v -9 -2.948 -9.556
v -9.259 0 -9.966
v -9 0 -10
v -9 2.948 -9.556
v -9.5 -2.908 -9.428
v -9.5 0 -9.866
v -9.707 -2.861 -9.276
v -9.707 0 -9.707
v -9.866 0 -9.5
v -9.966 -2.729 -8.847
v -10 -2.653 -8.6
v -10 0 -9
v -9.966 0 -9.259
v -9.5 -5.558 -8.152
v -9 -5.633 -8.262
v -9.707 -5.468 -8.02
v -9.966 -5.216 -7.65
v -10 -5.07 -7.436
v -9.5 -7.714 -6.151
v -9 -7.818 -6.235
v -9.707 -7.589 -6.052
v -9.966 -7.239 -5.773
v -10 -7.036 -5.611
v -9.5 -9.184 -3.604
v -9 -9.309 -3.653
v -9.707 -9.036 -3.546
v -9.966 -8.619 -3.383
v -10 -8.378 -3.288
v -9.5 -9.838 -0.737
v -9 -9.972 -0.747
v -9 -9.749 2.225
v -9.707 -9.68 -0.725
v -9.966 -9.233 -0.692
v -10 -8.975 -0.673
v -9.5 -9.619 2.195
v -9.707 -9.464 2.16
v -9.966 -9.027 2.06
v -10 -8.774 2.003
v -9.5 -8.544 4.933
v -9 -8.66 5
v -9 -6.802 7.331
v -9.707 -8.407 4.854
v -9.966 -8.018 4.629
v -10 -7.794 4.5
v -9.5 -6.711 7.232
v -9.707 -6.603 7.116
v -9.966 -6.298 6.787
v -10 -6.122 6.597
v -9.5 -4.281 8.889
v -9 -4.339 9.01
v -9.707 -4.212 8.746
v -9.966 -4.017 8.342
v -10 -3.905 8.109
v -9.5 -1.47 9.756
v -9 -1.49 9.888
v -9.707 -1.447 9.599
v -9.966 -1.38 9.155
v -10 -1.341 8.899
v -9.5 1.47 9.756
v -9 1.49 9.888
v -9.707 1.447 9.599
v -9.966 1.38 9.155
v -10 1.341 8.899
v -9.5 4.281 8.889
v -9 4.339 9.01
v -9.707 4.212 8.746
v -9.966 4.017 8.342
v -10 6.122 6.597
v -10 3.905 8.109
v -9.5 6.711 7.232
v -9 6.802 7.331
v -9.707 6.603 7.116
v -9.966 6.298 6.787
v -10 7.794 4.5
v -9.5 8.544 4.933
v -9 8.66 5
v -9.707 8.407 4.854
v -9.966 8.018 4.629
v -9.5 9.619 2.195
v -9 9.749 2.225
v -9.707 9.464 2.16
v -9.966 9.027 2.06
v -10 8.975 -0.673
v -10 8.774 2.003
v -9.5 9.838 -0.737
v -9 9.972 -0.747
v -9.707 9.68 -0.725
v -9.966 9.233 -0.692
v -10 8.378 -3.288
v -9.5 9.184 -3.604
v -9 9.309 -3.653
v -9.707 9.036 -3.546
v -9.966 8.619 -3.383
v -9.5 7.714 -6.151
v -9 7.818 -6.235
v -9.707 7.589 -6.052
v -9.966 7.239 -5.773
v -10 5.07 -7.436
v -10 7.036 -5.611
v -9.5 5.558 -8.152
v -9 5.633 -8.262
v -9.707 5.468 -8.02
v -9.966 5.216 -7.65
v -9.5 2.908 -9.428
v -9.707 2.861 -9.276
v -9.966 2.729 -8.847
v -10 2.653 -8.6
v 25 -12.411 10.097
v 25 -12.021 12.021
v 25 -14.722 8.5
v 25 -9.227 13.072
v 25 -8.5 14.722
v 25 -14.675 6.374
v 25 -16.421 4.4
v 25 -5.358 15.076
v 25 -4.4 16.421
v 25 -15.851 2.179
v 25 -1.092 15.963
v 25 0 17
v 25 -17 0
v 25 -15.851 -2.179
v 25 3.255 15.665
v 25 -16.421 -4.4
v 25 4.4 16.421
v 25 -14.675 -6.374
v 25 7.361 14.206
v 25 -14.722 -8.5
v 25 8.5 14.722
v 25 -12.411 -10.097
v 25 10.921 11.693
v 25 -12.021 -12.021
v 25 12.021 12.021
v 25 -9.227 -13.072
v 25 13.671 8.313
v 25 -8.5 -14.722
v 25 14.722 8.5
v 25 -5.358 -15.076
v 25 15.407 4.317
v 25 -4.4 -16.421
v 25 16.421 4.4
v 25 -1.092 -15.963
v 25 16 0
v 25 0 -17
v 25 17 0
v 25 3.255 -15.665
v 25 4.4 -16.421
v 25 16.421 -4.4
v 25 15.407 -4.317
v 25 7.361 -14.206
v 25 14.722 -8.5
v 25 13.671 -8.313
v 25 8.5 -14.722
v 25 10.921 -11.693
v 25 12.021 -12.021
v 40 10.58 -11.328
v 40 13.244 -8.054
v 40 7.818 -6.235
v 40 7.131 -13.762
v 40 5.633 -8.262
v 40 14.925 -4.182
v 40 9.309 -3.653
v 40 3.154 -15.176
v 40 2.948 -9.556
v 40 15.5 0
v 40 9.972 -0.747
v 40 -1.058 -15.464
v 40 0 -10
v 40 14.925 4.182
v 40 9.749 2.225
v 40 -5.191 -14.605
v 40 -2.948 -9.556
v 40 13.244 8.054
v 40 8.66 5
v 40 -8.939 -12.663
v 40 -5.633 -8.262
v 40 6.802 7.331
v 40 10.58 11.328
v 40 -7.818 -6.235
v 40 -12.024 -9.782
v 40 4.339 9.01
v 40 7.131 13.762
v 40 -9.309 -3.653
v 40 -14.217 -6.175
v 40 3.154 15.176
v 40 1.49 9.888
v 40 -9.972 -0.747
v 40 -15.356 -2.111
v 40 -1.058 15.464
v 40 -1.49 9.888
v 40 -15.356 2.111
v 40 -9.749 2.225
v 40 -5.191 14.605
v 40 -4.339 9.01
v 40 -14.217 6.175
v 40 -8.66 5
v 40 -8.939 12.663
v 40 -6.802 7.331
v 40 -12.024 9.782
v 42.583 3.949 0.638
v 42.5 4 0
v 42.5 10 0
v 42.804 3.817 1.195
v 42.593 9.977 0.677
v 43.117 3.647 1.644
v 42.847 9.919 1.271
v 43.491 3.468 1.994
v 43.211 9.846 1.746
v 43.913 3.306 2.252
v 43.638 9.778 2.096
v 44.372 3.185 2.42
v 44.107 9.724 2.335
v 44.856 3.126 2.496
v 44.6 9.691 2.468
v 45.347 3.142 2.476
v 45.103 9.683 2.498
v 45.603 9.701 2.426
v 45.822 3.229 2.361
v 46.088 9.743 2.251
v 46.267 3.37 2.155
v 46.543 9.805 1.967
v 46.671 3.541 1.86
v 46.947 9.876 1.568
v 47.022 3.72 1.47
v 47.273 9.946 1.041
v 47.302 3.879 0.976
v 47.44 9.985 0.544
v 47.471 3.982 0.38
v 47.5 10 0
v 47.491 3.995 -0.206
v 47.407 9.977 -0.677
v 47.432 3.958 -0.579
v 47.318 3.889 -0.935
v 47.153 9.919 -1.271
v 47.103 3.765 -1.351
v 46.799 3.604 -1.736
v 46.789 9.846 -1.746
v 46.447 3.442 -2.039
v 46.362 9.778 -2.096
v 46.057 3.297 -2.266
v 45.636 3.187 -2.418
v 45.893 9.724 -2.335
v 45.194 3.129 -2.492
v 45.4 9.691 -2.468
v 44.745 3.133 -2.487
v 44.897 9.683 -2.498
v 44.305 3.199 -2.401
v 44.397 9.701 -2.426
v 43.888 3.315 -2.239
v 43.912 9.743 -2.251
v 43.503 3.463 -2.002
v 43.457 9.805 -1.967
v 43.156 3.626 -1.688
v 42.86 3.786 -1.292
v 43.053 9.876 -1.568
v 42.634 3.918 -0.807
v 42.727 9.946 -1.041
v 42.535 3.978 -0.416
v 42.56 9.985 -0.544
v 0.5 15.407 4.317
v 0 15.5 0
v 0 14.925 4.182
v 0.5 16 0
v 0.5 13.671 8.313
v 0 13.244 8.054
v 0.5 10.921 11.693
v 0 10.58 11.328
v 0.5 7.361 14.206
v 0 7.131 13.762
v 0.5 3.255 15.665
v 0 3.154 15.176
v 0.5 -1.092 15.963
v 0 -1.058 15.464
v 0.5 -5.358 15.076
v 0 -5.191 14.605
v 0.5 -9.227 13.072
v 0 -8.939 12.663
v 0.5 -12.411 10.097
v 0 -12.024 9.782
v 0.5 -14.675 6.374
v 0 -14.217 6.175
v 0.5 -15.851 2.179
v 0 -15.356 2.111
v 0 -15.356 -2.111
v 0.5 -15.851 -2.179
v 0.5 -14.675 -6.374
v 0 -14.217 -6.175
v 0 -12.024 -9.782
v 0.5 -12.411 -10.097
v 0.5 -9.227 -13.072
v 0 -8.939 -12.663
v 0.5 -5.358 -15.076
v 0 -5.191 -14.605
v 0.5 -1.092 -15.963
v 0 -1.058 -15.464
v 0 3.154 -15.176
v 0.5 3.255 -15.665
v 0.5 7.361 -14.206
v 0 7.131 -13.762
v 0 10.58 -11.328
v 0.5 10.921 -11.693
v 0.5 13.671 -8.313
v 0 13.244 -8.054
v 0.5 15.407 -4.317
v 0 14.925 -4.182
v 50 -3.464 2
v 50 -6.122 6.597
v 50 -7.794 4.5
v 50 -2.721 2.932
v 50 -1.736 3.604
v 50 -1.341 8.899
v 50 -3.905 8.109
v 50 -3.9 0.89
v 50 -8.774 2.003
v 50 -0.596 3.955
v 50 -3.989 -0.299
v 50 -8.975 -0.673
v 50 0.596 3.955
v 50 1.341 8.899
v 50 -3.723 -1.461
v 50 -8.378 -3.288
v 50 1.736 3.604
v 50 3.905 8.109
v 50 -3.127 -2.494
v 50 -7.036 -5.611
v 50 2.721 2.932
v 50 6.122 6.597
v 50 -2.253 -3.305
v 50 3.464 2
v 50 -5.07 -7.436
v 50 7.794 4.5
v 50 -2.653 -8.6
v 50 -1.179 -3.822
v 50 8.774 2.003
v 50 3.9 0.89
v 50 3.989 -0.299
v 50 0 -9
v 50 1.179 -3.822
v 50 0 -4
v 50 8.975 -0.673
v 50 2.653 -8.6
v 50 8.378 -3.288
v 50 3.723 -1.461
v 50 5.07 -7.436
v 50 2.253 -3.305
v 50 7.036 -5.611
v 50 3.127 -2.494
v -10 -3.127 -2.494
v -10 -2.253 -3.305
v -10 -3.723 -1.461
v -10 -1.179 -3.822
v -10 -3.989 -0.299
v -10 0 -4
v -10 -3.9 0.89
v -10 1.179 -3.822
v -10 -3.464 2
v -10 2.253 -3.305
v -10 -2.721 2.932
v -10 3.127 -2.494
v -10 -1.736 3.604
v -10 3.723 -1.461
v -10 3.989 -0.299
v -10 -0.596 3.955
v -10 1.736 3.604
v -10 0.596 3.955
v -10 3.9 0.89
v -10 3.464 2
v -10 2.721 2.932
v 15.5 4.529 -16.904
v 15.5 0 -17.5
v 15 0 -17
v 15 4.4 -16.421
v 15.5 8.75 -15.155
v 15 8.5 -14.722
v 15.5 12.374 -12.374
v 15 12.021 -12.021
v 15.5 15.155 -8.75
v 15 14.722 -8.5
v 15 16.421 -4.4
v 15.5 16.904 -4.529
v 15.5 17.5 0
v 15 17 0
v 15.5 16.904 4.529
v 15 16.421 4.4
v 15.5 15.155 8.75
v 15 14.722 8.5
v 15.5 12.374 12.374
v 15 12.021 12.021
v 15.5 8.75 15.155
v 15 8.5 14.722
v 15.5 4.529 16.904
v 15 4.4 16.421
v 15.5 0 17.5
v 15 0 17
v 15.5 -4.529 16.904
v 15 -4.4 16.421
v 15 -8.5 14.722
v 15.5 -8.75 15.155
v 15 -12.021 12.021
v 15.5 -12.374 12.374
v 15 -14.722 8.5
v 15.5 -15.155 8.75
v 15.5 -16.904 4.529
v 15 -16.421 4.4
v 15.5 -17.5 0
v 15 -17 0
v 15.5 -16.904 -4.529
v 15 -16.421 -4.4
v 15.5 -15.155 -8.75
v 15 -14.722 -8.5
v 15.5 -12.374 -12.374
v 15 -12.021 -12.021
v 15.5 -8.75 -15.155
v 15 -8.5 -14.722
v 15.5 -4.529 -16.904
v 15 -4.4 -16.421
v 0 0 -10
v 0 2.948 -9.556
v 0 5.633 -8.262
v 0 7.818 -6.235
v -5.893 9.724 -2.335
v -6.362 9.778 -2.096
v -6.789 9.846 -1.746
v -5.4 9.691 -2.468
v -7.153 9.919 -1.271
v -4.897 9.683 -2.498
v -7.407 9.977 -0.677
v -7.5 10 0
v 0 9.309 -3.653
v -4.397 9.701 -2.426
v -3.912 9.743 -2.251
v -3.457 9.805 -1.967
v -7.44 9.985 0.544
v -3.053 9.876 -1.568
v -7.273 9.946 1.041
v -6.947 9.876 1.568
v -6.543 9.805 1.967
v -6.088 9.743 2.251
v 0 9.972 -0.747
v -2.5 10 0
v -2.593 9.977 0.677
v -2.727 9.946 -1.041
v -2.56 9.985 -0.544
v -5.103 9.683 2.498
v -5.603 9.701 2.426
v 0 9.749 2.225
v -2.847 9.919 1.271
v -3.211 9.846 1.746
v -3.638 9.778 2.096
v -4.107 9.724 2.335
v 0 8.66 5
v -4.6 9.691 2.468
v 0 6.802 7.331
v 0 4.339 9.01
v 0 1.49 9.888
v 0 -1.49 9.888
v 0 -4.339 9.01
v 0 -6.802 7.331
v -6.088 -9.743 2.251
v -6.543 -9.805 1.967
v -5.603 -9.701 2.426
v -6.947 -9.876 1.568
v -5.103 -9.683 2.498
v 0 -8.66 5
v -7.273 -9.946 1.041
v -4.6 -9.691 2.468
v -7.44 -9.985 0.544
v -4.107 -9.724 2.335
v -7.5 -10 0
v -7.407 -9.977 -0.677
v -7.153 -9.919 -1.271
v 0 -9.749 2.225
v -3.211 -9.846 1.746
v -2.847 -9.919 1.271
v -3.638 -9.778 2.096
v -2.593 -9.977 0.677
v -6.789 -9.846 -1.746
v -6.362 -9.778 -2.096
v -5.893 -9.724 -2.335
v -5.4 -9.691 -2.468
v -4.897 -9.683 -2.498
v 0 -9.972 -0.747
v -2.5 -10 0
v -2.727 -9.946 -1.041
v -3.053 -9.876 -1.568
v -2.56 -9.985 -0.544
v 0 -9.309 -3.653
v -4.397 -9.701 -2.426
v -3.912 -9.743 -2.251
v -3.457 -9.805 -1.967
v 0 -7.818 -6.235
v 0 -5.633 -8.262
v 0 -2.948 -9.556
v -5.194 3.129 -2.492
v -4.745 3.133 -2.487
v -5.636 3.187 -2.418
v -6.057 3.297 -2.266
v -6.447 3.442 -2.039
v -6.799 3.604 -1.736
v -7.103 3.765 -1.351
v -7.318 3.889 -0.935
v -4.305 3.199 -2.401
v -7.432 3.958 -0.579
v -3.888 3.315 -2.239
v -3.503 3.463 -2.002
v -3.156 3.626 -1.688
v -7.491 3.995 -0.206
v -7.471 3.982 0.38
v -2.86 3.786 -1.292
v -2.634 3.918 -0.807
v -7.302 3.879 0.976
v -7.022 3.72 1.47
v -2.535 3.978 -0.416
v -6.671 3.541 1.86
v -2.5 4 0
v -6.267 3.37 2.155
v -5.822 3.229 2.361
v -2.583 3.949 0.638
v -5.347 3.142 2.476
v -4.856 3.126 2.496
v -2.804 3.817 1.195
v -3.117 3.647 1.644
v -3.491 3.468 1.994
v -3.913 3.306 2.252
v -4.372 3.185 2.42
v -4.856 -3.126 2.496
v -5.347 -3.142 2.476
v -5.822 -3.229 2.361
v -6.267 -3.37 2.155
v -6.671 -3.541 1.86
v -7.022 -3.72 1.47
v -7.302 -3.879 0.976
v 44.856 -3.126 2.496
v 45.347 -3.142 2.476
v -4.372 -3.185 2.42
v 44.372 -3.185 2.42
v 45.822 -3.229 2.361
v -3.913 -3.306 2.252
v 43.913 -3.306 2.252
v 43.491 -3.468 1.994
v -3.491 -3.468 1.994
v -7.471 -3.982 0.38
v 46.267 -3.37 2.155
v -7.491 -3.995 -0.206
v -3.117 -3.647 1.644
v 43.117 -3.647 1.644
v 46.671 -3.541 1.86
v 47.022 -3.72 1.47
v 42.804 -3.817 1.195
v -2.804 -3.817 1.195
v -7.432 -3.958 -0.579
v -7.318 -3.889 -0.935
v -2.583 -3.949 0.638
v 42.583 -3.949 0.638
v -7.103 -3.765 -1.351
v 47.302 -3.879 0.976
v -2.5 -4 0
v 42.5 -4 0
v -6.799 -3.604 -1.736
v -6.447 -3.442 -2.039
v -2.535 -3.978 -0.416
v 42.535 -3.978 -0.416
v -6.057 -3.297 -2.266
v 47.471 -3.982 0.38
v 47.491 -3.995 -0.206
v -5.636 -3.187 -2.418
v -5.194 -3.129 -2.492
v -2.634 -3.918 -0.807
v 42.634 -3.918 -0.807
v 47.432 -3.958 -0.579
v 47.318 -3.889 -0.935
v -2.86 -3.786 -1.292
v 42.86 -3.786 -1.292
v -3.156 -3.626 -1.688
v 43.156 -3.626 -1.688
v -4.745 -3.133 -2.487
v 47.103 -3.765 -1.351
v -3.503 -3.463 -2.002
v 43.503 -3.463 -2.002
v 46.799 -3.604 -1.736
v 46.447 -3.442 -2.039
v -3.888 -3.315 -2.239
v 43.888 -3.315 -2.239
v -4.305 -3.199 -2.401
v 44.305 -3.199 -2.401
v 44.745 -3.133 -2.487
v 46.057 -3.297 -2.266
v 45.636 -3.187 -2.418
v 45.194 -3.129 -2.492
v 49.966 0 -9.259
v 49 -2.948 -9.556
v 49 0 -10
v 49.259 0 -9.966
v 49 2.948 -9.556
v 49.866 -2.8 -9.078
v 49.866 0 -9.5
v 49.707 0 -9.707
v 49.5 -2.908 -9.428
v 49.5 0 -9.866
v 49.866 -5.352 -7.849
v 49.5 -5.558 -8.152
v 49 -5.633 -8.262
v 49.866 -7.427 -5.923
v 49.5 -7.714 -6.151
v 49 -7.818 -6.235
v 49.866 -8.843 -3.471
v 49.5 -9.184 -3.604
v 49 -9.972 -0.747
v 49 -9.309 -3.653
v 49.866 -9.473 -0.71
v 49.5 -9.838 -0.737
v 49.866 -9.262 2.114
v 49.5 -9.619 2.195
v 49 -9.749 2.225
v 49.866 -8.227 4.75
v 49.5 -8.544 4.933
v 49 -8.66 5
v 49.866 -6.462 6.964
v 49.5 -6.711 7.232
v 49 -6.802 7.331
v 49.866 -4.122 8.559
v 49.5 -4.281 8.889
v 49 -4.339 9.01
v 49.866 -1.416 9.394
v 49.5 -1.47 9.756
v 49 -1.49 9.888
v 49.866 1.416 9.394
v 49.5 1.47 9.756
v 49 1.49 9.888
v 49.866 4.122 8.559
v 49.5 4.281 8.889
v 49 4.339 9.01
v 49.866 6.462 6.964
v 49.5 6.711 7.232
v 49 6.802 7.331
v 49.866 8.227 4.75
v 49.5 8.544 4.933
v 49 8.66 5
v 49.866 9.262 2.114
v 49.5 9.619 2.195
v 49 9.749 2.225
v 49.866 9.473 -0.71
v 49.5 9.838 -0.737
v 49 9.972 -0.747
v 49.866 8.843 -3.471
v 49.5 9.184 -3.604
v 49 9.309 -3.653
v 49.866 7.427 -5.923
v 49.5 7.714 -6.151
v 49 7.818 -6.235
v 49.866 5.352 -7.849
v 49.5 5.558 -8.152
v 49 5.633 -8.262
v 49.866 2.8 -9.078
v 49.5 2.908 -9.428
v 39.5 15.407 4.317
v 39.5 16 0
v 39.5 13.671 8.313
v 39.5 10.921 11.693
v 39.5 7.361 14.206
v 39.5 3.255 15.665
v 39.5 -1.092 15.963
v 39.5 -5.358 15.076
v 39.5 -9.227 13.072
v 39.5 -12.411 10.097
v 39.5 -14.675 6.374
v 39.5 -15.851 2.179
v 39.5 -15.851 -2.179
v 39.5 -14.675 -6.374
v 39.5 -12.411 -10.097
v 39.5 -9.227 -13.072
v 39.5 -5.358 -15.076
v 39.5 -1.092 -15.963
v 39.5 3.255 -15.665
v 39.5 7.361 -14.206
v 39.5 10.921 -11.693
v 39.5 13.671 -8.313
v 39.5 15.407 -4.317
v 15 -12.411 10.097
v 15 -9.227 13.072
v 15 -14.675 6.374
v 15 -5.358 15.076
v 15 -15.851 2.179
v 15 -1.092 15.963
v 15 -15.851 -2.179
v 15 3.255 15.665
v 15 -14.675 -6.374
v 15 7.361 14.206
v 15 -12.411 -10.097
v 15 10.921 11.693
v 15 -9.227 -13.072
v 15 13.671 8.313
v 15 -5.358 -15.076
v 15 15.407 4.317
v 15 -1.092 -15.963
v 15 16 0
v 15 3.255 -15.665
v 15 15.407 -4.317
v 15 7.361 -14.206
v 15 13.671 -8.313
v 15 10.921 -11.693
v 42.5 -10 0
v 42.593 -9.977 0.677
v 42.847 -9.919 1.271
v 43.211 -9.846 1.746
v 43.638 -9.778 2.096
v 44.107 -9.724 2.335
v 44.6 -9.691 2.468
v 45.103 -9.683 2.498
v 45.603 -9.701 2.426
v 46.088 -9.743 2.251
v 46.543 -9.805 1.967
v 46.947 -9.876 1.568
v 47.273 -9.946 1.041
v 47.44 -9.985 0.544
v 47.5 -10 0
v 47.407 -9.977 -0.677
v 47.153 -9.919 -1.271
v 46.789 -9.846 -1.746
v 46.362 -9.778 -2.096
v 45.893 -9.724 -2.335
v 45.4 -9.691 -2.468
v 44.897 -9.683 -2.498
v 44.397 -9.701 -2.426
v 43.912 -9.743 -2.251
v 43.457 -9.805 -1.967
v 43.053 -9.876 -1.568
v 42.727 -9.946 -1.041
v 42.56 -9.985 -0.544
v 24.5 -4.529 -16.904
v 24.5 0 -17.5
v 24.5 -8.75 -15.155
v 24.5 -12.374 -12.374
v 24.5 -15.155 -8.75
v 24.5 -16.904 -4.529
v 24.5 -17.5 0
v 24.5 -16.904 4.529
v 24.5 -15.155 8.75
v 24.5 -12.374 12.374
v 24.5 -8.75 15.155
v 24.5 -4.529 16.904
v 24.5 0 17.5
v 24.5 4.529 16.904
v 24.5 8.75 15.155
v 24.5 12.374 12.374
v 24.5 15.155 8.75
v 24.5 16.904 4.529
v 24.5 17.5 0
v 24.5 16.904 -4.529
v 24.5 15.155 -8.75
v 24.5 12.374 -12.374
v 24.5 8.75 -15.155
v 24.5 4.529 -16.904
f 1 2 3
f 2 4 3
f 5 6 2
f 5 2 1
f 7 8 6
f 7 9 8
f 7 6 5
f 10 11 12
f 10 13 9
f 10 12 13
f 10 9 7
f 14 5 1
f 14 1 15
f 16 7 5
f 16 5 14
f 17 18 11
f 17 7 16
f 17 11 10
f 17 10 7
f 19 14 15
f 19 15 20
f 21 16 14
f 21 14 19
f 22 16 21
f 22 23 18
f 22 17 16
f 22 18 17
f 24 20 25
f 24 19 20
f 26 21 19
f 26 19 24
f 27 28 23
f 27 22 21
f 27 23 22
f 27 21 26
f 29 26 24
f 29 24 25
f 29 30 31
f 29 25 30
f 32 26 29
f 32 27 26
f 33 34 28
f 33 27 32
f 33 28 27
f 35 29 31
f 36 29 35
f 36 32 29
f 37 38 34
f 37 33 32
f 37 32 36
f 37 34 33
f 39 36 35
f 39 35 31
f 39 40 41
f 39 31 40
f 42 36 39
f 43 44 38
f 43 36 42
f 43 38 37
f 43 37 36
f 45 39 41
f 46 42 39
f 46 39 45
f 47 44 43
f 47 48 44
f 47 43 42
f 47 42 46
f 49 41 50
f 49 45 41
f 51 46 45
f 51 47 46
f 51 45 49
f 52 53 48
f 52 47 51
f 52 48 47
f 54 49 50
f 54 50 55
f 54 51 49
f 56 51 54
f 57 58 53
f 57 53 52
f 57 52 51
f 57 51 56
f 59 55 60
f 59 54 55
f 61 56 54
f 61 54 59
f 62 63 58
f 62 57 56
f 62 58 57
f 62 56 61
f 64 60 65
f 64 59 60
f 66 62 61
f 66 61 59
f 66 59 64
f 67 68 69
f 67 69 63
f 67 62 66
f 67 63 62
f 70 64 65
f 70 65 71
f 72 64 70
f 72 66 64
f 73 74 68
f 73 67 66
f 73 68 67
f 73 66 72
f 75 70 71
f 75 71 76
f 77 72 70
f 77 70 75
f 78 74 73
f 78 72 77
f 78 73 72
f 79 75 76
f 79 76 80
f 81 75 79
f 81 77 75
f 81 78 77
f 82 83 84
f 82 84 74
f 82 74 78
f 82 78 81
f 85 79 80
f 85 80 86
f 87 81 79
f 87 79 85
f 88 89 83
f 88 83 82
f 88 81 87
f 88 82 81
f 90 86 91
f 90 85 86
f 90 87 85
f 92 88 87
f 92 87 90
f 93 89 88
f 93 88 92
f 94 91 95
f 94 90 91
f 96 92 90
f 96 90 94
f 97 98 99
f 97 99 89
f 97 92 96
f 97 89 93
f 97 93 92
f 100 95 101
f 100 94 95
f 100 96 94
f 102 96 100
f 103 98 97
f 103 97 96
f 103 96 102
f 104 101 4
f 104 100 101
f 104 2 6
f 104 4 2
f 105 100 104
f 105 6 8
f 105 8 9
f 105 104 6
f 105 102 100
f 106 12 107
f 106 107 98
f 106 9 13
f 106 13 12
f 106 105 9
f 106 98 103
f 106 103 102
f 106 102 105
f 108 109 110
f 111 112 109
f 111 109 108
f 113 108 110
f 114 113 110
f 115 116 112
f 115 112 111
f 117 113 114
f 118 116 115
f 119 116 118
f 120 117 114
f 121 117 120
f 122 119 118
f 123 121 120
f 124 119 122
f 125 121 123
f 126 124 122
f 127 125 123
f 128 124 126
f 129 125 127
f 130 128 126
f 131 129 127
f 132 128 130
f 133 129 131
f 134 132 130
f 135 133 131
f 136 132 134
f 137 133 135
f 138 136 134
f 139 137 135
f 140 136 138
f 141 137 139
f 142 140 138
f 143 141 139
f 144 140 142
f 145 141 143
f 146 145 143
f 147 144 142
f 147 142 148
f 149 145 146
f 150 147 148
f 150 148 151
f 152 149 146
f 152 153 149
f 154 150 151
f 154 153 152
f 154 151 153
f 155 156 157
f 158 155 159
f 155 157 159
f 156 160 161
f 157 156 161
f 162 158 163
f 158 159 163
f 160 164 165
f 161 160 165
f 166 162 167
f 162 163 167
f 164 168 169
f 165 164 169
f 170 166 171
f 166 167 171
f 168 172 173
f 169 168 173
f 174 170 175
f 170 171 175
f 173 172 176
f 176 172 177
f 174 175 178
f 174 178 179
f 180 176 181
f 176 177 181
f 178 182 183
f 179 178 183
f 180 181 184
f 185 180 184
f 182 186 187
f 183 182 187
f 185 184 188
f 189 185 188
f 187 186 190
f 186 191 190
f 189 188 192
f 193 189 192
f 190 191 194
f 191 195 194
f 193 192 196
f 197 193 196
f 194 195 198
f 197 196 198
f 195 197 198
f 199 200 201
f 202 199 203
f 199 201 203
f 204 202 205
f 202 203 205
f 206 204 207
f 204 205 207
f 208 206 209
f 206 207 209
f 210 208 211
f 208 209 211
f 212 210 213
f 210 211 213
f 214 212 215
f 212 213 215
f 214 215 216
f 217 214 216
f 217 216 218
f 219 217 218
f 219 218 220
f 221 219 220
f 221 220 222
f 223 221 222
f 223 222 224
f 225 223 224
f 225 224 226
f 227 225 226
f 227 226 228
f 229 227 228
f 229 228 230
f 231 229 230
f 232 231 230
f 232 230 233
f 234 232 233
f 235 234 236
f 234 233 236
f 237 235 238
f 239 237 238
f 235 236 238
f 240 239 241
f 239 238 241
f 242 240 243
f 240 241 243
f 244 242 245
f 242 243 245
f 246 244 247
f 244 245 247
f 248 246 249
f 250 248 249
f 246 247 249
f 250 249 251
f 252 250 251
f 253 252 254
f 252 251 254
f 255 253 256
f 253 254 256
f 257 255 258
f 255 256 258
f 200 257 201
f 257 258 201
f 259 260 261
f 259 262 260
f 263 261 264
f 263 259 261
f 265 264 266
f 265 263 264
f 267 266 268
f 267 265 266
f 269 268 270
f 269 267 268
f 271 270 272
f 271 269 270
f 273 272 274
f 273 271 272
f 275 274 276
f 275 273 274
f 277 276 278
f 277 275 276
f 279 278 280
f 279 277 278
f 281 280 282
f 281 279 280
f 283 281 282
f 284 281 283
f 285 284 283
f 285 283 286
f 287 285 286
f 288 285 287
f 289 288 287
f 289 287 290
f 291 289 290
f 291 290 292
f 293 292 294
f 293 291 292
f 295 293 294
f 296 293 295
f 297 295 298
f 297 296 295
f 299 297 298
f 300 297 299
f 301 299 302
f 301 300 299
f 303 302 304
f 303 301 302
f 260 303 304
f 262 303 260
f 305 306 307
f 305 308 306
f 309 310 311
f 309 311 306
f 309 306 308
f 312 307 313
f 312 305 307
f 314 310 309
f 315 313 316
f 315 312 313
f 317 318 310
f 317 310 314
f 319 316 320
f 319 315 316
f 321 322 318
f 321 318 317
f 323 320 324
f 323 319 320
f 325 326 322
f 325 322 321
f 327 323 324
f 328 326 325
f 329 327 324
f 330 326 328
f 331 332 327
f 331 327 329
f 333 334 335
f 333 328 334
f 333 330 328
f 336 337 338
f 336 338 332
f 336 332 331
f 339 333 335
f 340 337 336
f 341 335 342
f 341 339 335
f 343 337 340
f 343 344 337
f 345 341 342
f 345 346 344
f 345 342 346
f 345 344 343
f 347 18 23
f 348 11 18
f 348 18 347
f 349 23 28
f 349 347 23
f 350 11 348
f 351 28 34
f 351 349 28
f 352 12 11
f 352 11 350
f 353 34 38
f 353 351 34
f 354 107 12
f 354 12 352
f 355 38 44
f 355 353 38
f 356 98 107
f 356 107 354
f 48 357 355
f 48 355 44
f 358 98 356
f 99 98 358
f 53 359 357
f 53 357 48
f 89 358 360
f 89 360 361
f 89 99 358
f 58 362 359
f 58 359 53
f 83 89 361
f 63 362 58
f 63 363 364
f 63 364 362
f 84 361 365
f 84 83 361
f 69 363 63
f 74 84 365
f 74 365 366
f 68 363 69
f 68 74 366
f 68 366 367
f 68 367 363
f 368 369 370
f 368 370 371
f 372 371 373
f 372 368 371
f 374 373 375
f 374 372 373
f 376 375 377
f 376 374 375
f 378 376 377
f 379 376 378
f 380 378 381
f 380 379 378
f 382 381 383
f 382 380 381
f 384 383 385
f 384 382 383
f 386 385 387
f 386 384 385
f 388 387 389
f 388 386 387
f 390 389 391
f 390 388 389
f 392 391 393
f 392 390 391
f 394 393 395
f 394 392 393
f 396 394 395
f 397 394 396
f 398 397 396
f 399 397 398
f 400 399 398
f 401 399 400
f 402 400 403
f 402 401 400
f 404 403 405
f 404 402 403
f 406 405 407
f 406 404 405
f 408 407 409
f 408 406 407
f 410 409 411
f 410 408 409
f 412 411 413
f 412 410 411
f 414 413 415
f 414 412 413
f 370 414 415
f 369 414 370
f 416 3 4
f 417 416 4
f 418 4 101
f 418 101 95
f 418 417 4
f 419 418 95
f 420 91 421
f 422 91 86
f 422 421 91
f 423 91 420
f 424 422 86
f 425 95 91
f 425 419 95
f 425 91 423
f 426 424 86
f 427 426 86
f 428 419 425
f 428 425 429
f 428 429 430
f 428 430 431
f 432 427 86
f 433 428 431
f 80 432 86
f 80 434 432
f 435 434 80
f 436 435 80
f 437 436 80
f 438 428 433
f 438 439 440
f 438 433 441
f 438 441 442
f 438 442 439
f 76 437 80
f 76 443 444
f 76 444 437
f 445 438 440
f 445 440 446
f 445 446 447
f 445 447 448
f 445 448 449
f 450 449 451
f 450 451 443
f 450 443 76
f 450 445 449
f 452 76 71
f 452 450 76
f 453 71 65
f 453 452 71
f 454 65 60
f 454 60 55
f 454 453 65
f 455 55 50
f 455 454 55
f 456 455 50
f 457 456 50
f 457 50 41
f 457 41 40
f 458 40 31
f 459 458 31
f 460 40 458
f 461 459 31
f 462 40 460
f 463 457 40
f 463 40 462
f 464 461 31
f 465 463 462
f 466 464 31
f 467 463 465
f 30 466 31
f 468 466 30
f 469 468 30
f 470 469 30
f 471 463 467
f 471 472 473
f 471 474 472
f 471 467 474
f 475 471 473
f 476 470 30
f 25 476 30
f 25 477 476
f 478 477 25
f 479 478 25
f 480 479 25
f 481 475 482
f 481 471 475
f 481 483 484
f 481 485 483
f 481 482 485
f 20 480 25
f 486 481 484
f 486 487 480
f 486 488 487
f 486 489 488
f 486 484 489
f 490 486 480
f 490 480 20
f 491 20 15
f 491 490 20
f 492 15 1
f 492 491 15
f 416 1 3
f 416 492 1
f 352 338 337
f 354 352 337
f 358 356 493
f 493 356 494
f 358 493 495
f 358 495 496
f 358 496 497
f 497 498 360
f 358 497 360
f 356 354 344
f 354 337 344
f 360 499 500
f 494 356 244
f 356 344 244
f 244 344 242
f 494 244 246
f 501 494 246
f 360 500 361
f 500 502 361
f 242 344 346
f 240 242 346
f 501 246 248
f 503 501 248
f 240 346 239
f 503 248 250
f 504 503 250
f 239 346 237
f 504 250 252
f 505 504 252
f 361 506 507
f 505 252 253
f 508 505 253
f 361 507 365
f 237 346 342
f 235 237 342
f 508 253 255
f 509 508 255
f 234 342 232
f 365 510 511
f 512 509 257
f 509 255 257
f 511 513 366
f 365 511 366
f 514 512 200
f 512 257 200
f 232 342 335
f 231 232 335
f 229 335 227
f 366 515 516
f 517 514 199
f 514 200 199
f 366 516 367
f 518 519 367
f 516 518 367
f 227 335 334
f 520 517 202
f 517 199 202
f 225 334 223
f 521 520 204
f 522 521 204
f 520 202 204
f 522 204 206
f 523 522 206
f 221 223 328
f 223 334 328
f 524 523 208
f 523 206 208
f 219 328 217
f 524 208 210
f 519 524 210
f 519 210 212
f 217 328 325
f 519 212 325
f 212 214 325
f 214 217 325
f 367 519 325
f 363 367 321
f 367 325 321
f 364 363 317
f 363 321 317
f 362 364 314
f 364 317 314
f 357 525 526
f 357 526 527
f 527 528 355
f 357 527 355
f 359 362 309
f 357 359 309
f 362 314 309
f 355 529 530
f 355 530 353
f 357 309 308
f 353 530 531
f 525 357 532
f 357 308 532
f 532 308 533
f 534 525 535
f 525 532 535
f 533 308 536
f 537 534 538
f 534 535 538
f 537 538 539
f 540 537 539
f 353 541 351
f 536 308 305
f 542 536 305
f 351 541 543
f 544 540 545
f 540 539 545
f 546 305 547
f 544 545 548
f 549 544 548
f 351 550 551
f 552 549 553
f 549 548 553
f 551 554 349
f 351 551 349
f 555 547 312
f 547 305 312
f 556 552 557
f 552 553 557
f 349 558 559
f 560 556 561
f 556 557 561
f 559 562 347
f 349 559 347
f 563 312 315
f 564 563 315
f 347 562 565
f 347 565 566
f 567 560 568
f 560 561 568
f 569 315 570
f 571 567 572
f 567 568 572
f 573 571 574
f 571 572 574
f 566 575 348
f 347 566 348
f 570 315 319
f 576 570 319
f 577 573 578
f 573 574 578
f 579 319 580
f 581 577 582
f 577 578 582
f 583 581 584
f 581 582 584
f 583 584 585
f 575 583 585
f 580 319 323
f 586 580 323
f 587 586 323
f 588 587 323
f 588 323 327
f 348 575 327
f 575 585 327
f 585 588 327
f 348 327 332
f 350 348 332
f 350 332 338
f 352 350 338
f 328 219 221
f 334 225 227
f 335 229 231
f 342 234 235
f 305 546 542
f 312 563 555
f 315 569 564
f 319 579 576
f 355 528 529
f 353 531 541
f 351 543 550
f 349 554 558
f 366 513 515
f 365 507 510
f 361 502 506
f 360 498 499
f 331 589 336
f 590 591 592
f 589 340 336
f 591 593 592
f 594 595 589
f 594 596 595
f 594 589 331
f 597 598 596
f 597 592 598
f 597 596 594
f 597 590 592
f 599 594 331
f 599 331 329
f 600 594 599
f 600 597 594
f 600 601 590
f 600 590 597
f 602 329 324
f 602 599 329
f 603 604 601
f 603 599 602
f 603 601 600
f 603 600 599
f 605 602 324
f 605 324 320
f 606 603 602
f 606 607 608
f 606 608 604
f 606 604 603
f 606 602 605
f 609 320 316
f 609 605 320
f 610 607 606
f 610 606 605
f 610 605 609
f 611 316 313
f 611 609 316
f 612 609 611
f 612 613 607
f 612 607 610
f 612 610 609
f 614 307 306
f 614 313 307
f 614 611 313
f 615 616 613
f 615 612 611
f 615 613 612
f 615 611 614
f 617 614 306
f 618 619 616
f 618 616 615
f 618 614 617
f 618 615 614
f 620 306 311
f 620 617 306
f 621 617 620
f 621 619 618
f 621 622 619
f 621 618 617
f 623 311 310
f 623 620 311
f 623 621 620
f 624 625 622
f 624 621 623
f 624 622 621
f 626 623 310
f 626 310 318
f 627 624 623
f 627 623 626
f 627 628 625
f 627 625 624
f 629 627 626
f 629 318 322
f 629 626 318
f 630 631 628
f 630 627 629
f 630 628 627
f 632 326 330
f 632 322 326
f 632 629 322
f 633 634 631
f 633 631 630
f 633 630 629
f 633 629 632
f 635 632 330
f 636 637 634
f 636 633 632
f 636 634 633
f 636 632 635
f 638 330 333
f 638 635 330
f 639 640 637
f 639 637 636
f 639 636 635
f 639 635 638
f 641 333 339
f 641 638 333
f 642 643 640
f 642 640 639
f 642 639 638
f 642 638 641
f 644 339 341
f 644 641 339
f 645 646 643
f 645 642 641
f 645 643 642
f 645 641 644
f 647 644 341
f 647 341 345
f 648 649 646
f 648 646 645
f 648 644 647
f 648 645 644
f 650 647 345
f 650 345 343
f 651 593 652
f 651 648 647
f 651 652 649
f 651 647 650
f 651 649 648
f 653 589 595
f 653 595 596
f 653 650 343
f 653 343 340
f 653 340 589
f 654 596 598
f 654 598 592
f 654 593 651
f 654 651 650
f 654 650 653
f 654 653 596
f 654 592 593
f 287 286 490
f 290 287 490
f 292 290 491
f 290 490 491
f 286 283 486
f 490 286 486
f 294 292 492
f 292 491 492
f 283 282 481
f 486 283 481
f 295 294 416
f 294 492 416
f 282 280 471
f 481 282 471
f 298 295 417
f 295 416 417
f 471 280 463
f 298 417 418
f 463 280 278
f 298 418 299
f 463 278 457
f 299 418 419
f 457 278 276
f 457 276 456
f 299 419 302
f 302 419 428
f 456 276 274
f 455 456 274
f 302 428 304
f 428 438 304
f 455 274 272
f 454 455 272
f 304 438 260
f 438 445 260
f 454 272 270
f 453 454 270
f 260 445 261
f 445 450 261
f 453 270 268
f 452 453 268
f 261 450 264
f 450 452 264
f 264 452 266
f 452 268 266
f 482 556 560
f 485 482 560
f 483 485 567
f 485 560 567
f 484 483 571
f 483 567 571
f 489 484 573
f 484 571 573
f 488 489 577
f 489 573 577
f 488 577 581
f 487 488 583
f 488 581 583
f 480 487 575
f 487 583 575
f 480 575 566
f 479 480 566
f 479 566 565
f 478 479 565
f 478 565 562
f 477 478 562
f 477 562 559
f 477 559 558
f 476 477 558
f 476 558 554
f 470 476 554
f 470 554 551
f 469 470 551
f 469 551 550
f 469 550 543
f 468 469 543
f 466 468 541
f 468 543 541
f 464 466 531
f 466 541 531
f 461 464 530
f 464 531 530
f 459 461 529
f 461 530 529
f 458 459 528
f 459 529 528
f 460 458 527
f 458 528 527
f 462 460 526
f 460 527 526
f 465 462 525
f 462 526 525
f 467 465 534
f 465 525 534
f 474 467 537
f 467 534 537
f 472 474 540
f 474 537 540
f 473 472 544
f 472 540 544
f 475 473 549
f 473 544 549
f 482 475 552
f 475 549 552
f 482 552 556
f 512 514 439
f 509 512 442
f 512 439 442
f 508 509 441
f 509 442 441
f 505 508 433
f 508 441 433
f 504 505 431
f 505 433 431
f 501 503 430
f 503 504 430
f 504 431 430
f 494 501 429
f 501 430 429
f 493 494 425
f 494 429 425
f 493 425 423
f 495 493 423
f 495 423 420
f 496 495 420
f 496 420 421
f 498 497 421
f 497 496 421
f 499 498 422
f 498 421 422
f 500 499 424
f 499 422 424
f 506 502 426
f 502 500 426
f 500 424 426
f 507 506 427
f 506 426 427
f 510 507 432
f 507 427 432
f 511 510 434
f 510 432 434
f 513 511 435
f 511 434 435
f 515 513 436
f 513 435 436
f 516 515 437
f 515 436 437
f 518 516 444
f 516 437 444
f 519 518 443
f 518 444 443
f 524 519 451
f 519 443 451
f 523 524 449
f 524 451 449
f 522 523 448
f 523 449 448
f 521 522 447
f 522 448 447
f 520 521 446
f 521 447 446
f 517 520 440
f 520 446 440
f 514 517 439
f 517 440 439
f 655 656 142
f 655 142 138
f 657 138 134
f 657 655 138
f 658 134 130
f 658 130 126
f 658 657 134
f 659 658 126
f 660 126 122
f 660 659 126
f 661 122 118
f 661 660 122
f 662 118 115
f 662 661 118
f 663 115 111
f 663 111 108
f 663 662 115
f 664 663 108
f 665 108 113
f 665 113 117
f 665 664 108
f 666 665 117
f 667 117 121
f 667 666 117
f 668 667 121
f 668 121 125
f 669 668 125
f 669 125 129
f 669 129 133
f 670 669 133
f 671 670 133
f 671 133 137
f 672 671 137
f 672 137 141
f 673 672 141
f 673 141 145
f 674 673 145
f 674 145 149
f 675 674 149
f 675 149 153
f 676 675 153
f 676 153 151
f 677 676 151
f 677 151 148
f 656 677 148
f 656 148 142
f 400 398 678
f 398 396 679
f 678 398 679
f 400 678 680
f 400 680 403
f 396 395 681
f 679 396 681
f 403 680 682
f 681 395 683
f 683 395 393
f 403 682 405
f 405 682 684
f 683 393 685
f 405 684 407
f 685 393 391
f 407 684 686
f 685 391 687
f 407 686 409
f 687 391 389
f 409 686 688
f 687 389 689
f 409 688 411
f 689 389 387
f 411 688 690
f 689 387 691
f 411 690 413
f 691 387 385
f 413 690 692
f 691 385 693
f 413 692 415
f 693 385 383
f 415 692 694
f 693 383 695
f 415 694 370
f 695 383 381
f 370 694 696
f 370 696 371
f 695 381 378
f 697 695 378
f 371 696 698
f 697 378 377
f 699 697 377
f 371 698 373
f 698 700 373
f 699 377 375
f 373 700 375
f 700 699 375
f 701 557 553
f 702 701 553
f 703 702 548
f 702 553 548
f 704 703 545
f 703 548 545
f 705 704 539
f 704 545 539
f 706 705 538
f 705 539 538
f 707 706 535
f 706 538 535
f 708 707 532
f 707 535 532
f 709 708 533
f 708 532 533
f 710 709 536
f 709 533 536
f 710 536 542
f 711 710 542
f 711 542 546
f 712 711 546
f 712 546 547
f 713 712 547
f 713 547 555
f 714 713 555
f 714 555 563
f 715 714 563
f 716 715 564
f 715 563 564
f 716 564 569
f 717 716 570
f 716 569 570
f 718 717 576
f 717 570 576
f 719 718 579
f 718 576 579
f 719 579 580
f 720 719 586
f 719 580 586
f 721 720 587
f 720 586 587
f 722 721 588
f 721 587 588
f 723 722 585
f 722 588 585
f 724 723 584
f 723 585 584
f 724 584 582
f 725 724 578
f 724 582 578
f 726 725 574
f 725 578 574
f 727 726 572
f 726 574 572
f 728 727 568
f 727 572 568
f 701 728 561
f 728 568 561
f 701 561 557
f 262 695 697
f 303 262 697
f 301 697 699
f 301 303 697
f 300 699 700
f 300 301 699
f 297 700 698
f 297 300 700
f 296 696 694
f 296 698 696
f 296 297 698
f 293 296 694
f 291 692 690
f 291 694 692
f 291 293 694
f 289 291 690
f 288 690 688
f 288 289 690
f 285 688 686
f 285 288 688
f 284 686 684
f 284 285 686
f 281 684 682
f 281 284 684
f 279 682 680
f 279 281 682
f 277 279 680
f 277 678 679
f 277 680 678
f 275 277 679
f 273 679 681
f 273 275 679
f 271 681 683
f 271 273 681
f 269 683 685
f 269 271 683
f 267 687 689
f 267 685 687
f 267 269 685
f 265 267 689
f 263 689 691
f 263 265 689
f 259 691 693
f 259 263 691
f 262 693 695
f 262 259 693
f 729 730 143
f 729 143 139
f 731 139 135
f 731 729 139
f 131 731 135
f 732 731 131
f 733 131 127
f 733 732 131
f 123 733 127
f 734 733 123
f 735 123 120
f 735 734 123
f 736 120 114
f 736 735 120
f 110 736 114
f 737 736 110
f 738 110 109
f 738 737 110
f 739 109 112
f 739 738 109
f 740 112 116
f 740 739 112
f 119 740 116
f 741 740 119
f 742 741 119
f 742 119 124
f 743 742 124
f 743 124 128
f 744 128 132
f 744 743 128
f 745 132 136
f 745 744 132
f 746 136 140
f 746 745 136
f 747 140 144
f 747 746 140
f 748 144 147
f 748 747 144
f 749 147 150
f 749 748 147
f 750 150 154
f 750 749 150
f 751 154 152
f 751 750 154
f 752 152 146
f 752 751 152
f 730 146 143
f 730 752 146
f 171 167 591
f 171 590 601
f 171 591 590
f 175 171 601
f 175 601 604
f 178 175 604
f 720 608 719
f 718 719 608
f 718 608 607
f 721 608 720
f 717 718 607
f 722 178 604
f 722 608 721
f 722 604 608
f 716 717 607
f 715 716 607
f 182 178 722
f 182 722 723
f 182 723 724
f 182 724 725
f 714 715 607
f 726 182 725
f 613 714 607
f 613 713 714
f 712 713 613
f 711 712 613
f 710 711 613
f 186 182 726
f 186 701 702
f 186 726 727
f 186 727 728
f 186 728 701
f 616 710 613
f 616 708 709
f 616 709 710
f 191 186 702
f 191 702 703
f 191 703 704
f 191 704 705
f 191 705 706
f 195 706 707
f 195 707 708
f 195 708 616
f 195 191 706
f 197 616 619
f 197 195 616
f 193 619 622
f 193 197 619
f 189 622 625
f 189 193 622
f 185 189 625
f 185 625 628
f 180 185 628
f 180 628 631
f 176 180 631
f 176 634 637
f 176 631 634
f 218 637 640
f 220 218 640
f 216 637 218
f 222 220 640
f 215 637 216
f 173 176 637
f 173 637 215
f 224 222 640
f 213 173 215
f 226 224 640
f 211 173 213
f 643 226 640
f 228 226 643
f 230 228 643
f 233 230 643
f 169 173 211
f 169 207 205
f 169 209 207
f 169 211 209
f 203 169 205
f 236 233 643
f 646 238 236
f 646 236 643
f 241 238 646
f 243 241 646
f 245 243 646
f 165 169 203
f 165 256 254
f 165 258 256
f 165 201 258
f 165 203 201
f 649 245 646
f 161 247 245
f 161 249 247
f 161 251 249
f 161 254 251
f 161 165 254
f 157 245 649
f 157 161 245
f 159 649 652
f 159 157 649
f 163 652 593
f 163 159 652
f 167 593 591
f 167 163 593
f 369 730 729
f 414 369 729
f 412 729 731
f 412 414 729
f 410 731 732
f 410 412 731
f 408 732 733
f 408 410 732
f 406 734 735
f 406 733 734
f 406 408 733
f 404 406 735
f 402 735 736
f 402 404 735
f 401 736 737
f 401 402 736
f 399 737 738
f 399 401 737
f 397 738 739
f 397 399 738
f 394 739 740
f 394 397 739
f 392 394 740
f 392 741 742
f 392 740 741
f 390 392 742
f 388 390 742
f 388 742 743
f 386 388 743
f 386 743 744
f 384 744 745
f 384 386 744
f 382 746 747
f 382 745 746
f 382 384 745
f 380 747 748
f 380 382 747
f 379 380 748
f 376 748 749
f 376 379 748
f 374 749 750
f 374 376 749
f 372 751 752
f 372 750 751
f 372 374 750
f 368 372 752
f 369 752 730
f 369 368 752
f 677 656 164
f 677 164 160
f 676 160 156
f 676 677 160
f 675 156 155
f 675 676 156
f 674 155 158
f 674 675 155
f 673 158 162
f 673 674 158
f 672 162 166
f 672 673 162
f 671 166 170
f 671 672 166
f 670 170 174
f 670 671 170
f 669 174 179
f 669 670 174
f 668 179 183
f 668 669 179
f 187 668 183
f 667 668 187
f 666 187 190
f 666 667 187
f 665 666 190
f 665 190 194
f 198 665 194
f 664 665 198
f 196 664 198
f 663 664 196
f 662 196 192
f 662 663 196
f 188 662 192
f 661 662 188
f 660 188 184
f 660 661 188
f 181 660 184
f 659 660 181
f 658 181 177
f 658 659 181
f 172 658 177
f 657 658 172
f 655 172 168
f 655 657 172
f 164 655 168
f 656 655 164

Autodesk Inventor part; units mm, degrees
ref_plane "XY Plane" through (0, 0, 0) normal (0, 0, 1) x (1, 0, 0)
sketch "Sketch1" plane through (0, 0, 0) normal (1, 0, 0) x (0, 1, 0)
  circle A0 centre (0, 0) radius 16
  dimension "d0" = 32
extrude "Extrusion1" add sketch "Sketch1" along normal blind 15
sketch "Sketch2" plane through (15, 0, 0) normal (1, 0, 0) x (0, 0, -1)
  circle A0 centre (0, 0) radius 17.5
  dimension "d3" = 35
extrude "Extrusion2" add sketch "Sketch2" along normal blind 10
ref_plane "Work Plane2" through (20, 0, 0) normal (1, 0, 0) x (0, 1, 0)
mirror "Mirror1" about plane through (20, 0, 0) normal (1, 0, 0) of "Extrusion1"
thread "Thread3" size "M32x1.5" class "6g" standard "ANSI Metric M Profile" length 20
thread "Thread4" size "M32x1.5" class "6g" standard "ANSI Metric M Profile" length 20
chamfer "Chamfer2" distance 0.5 angle 45 2 edges at (15, 0, 17.5) (25, 0, 17.5)
sketch "Sketch6" plane through (40, 0, 0) normal (1, 0, 0) x (0, 0, -1)
  circle A0 centre (0, 0) radius 10
  dimension "d33" = 20
extrude "Extrusion6" add sketch "Sketch6" along normal blind 10
ref_plane "Work Plane3" through (0, 10, 0) normal (0, 1, 0) x (-1, 0, 0)
sketch "Sketch8" plane through (0, 10, 0) normal (0, 1, 0) x (-1, 0, 0)
  line L0 (-50, 10) -> (-50, -10) projected
  line L1 (-50, 0) -> (-45, 0)
  circle A0 centre (-45, 0) radius 2.5
  point P0 (0, 0)
  dimension "d40" = 5
  dimension "d41" = 5
extrude "Extrusion8" cut sketch "Sketch8" against normal blind 30
mirror "Mirror2" about plane through (20, 0, 0) normal (1, 0, 0) of "Extrusion6", "Extrusion8"
sketch "Sketch7" plane through (50, 0, 0) normal (1, 0, 0) x (0, 0, -1)
  circle A0 centre (0, 0) radius 4
  dimension "d36" = 8
extrude "Extrusion7" cut sketch "Sketch7" against normal blind 73
chamfer "Chamfer3" distance 0.5 angle 45 2 edges at (40, -16, 0) (0, -16, 0)
fillet "Fillet3" radius 1 2 edges at (50, 0, 10) (-10, 0, 10)
thread "Thread5" size "M5x0.5" class "6H" standard "ANSI Metric M Profile" length 20
thread "Thread6" size "M5x0.5" class "6H" standard "ANSI Metric M Profile" length 20
properties part number "sprocet adaptor2"
